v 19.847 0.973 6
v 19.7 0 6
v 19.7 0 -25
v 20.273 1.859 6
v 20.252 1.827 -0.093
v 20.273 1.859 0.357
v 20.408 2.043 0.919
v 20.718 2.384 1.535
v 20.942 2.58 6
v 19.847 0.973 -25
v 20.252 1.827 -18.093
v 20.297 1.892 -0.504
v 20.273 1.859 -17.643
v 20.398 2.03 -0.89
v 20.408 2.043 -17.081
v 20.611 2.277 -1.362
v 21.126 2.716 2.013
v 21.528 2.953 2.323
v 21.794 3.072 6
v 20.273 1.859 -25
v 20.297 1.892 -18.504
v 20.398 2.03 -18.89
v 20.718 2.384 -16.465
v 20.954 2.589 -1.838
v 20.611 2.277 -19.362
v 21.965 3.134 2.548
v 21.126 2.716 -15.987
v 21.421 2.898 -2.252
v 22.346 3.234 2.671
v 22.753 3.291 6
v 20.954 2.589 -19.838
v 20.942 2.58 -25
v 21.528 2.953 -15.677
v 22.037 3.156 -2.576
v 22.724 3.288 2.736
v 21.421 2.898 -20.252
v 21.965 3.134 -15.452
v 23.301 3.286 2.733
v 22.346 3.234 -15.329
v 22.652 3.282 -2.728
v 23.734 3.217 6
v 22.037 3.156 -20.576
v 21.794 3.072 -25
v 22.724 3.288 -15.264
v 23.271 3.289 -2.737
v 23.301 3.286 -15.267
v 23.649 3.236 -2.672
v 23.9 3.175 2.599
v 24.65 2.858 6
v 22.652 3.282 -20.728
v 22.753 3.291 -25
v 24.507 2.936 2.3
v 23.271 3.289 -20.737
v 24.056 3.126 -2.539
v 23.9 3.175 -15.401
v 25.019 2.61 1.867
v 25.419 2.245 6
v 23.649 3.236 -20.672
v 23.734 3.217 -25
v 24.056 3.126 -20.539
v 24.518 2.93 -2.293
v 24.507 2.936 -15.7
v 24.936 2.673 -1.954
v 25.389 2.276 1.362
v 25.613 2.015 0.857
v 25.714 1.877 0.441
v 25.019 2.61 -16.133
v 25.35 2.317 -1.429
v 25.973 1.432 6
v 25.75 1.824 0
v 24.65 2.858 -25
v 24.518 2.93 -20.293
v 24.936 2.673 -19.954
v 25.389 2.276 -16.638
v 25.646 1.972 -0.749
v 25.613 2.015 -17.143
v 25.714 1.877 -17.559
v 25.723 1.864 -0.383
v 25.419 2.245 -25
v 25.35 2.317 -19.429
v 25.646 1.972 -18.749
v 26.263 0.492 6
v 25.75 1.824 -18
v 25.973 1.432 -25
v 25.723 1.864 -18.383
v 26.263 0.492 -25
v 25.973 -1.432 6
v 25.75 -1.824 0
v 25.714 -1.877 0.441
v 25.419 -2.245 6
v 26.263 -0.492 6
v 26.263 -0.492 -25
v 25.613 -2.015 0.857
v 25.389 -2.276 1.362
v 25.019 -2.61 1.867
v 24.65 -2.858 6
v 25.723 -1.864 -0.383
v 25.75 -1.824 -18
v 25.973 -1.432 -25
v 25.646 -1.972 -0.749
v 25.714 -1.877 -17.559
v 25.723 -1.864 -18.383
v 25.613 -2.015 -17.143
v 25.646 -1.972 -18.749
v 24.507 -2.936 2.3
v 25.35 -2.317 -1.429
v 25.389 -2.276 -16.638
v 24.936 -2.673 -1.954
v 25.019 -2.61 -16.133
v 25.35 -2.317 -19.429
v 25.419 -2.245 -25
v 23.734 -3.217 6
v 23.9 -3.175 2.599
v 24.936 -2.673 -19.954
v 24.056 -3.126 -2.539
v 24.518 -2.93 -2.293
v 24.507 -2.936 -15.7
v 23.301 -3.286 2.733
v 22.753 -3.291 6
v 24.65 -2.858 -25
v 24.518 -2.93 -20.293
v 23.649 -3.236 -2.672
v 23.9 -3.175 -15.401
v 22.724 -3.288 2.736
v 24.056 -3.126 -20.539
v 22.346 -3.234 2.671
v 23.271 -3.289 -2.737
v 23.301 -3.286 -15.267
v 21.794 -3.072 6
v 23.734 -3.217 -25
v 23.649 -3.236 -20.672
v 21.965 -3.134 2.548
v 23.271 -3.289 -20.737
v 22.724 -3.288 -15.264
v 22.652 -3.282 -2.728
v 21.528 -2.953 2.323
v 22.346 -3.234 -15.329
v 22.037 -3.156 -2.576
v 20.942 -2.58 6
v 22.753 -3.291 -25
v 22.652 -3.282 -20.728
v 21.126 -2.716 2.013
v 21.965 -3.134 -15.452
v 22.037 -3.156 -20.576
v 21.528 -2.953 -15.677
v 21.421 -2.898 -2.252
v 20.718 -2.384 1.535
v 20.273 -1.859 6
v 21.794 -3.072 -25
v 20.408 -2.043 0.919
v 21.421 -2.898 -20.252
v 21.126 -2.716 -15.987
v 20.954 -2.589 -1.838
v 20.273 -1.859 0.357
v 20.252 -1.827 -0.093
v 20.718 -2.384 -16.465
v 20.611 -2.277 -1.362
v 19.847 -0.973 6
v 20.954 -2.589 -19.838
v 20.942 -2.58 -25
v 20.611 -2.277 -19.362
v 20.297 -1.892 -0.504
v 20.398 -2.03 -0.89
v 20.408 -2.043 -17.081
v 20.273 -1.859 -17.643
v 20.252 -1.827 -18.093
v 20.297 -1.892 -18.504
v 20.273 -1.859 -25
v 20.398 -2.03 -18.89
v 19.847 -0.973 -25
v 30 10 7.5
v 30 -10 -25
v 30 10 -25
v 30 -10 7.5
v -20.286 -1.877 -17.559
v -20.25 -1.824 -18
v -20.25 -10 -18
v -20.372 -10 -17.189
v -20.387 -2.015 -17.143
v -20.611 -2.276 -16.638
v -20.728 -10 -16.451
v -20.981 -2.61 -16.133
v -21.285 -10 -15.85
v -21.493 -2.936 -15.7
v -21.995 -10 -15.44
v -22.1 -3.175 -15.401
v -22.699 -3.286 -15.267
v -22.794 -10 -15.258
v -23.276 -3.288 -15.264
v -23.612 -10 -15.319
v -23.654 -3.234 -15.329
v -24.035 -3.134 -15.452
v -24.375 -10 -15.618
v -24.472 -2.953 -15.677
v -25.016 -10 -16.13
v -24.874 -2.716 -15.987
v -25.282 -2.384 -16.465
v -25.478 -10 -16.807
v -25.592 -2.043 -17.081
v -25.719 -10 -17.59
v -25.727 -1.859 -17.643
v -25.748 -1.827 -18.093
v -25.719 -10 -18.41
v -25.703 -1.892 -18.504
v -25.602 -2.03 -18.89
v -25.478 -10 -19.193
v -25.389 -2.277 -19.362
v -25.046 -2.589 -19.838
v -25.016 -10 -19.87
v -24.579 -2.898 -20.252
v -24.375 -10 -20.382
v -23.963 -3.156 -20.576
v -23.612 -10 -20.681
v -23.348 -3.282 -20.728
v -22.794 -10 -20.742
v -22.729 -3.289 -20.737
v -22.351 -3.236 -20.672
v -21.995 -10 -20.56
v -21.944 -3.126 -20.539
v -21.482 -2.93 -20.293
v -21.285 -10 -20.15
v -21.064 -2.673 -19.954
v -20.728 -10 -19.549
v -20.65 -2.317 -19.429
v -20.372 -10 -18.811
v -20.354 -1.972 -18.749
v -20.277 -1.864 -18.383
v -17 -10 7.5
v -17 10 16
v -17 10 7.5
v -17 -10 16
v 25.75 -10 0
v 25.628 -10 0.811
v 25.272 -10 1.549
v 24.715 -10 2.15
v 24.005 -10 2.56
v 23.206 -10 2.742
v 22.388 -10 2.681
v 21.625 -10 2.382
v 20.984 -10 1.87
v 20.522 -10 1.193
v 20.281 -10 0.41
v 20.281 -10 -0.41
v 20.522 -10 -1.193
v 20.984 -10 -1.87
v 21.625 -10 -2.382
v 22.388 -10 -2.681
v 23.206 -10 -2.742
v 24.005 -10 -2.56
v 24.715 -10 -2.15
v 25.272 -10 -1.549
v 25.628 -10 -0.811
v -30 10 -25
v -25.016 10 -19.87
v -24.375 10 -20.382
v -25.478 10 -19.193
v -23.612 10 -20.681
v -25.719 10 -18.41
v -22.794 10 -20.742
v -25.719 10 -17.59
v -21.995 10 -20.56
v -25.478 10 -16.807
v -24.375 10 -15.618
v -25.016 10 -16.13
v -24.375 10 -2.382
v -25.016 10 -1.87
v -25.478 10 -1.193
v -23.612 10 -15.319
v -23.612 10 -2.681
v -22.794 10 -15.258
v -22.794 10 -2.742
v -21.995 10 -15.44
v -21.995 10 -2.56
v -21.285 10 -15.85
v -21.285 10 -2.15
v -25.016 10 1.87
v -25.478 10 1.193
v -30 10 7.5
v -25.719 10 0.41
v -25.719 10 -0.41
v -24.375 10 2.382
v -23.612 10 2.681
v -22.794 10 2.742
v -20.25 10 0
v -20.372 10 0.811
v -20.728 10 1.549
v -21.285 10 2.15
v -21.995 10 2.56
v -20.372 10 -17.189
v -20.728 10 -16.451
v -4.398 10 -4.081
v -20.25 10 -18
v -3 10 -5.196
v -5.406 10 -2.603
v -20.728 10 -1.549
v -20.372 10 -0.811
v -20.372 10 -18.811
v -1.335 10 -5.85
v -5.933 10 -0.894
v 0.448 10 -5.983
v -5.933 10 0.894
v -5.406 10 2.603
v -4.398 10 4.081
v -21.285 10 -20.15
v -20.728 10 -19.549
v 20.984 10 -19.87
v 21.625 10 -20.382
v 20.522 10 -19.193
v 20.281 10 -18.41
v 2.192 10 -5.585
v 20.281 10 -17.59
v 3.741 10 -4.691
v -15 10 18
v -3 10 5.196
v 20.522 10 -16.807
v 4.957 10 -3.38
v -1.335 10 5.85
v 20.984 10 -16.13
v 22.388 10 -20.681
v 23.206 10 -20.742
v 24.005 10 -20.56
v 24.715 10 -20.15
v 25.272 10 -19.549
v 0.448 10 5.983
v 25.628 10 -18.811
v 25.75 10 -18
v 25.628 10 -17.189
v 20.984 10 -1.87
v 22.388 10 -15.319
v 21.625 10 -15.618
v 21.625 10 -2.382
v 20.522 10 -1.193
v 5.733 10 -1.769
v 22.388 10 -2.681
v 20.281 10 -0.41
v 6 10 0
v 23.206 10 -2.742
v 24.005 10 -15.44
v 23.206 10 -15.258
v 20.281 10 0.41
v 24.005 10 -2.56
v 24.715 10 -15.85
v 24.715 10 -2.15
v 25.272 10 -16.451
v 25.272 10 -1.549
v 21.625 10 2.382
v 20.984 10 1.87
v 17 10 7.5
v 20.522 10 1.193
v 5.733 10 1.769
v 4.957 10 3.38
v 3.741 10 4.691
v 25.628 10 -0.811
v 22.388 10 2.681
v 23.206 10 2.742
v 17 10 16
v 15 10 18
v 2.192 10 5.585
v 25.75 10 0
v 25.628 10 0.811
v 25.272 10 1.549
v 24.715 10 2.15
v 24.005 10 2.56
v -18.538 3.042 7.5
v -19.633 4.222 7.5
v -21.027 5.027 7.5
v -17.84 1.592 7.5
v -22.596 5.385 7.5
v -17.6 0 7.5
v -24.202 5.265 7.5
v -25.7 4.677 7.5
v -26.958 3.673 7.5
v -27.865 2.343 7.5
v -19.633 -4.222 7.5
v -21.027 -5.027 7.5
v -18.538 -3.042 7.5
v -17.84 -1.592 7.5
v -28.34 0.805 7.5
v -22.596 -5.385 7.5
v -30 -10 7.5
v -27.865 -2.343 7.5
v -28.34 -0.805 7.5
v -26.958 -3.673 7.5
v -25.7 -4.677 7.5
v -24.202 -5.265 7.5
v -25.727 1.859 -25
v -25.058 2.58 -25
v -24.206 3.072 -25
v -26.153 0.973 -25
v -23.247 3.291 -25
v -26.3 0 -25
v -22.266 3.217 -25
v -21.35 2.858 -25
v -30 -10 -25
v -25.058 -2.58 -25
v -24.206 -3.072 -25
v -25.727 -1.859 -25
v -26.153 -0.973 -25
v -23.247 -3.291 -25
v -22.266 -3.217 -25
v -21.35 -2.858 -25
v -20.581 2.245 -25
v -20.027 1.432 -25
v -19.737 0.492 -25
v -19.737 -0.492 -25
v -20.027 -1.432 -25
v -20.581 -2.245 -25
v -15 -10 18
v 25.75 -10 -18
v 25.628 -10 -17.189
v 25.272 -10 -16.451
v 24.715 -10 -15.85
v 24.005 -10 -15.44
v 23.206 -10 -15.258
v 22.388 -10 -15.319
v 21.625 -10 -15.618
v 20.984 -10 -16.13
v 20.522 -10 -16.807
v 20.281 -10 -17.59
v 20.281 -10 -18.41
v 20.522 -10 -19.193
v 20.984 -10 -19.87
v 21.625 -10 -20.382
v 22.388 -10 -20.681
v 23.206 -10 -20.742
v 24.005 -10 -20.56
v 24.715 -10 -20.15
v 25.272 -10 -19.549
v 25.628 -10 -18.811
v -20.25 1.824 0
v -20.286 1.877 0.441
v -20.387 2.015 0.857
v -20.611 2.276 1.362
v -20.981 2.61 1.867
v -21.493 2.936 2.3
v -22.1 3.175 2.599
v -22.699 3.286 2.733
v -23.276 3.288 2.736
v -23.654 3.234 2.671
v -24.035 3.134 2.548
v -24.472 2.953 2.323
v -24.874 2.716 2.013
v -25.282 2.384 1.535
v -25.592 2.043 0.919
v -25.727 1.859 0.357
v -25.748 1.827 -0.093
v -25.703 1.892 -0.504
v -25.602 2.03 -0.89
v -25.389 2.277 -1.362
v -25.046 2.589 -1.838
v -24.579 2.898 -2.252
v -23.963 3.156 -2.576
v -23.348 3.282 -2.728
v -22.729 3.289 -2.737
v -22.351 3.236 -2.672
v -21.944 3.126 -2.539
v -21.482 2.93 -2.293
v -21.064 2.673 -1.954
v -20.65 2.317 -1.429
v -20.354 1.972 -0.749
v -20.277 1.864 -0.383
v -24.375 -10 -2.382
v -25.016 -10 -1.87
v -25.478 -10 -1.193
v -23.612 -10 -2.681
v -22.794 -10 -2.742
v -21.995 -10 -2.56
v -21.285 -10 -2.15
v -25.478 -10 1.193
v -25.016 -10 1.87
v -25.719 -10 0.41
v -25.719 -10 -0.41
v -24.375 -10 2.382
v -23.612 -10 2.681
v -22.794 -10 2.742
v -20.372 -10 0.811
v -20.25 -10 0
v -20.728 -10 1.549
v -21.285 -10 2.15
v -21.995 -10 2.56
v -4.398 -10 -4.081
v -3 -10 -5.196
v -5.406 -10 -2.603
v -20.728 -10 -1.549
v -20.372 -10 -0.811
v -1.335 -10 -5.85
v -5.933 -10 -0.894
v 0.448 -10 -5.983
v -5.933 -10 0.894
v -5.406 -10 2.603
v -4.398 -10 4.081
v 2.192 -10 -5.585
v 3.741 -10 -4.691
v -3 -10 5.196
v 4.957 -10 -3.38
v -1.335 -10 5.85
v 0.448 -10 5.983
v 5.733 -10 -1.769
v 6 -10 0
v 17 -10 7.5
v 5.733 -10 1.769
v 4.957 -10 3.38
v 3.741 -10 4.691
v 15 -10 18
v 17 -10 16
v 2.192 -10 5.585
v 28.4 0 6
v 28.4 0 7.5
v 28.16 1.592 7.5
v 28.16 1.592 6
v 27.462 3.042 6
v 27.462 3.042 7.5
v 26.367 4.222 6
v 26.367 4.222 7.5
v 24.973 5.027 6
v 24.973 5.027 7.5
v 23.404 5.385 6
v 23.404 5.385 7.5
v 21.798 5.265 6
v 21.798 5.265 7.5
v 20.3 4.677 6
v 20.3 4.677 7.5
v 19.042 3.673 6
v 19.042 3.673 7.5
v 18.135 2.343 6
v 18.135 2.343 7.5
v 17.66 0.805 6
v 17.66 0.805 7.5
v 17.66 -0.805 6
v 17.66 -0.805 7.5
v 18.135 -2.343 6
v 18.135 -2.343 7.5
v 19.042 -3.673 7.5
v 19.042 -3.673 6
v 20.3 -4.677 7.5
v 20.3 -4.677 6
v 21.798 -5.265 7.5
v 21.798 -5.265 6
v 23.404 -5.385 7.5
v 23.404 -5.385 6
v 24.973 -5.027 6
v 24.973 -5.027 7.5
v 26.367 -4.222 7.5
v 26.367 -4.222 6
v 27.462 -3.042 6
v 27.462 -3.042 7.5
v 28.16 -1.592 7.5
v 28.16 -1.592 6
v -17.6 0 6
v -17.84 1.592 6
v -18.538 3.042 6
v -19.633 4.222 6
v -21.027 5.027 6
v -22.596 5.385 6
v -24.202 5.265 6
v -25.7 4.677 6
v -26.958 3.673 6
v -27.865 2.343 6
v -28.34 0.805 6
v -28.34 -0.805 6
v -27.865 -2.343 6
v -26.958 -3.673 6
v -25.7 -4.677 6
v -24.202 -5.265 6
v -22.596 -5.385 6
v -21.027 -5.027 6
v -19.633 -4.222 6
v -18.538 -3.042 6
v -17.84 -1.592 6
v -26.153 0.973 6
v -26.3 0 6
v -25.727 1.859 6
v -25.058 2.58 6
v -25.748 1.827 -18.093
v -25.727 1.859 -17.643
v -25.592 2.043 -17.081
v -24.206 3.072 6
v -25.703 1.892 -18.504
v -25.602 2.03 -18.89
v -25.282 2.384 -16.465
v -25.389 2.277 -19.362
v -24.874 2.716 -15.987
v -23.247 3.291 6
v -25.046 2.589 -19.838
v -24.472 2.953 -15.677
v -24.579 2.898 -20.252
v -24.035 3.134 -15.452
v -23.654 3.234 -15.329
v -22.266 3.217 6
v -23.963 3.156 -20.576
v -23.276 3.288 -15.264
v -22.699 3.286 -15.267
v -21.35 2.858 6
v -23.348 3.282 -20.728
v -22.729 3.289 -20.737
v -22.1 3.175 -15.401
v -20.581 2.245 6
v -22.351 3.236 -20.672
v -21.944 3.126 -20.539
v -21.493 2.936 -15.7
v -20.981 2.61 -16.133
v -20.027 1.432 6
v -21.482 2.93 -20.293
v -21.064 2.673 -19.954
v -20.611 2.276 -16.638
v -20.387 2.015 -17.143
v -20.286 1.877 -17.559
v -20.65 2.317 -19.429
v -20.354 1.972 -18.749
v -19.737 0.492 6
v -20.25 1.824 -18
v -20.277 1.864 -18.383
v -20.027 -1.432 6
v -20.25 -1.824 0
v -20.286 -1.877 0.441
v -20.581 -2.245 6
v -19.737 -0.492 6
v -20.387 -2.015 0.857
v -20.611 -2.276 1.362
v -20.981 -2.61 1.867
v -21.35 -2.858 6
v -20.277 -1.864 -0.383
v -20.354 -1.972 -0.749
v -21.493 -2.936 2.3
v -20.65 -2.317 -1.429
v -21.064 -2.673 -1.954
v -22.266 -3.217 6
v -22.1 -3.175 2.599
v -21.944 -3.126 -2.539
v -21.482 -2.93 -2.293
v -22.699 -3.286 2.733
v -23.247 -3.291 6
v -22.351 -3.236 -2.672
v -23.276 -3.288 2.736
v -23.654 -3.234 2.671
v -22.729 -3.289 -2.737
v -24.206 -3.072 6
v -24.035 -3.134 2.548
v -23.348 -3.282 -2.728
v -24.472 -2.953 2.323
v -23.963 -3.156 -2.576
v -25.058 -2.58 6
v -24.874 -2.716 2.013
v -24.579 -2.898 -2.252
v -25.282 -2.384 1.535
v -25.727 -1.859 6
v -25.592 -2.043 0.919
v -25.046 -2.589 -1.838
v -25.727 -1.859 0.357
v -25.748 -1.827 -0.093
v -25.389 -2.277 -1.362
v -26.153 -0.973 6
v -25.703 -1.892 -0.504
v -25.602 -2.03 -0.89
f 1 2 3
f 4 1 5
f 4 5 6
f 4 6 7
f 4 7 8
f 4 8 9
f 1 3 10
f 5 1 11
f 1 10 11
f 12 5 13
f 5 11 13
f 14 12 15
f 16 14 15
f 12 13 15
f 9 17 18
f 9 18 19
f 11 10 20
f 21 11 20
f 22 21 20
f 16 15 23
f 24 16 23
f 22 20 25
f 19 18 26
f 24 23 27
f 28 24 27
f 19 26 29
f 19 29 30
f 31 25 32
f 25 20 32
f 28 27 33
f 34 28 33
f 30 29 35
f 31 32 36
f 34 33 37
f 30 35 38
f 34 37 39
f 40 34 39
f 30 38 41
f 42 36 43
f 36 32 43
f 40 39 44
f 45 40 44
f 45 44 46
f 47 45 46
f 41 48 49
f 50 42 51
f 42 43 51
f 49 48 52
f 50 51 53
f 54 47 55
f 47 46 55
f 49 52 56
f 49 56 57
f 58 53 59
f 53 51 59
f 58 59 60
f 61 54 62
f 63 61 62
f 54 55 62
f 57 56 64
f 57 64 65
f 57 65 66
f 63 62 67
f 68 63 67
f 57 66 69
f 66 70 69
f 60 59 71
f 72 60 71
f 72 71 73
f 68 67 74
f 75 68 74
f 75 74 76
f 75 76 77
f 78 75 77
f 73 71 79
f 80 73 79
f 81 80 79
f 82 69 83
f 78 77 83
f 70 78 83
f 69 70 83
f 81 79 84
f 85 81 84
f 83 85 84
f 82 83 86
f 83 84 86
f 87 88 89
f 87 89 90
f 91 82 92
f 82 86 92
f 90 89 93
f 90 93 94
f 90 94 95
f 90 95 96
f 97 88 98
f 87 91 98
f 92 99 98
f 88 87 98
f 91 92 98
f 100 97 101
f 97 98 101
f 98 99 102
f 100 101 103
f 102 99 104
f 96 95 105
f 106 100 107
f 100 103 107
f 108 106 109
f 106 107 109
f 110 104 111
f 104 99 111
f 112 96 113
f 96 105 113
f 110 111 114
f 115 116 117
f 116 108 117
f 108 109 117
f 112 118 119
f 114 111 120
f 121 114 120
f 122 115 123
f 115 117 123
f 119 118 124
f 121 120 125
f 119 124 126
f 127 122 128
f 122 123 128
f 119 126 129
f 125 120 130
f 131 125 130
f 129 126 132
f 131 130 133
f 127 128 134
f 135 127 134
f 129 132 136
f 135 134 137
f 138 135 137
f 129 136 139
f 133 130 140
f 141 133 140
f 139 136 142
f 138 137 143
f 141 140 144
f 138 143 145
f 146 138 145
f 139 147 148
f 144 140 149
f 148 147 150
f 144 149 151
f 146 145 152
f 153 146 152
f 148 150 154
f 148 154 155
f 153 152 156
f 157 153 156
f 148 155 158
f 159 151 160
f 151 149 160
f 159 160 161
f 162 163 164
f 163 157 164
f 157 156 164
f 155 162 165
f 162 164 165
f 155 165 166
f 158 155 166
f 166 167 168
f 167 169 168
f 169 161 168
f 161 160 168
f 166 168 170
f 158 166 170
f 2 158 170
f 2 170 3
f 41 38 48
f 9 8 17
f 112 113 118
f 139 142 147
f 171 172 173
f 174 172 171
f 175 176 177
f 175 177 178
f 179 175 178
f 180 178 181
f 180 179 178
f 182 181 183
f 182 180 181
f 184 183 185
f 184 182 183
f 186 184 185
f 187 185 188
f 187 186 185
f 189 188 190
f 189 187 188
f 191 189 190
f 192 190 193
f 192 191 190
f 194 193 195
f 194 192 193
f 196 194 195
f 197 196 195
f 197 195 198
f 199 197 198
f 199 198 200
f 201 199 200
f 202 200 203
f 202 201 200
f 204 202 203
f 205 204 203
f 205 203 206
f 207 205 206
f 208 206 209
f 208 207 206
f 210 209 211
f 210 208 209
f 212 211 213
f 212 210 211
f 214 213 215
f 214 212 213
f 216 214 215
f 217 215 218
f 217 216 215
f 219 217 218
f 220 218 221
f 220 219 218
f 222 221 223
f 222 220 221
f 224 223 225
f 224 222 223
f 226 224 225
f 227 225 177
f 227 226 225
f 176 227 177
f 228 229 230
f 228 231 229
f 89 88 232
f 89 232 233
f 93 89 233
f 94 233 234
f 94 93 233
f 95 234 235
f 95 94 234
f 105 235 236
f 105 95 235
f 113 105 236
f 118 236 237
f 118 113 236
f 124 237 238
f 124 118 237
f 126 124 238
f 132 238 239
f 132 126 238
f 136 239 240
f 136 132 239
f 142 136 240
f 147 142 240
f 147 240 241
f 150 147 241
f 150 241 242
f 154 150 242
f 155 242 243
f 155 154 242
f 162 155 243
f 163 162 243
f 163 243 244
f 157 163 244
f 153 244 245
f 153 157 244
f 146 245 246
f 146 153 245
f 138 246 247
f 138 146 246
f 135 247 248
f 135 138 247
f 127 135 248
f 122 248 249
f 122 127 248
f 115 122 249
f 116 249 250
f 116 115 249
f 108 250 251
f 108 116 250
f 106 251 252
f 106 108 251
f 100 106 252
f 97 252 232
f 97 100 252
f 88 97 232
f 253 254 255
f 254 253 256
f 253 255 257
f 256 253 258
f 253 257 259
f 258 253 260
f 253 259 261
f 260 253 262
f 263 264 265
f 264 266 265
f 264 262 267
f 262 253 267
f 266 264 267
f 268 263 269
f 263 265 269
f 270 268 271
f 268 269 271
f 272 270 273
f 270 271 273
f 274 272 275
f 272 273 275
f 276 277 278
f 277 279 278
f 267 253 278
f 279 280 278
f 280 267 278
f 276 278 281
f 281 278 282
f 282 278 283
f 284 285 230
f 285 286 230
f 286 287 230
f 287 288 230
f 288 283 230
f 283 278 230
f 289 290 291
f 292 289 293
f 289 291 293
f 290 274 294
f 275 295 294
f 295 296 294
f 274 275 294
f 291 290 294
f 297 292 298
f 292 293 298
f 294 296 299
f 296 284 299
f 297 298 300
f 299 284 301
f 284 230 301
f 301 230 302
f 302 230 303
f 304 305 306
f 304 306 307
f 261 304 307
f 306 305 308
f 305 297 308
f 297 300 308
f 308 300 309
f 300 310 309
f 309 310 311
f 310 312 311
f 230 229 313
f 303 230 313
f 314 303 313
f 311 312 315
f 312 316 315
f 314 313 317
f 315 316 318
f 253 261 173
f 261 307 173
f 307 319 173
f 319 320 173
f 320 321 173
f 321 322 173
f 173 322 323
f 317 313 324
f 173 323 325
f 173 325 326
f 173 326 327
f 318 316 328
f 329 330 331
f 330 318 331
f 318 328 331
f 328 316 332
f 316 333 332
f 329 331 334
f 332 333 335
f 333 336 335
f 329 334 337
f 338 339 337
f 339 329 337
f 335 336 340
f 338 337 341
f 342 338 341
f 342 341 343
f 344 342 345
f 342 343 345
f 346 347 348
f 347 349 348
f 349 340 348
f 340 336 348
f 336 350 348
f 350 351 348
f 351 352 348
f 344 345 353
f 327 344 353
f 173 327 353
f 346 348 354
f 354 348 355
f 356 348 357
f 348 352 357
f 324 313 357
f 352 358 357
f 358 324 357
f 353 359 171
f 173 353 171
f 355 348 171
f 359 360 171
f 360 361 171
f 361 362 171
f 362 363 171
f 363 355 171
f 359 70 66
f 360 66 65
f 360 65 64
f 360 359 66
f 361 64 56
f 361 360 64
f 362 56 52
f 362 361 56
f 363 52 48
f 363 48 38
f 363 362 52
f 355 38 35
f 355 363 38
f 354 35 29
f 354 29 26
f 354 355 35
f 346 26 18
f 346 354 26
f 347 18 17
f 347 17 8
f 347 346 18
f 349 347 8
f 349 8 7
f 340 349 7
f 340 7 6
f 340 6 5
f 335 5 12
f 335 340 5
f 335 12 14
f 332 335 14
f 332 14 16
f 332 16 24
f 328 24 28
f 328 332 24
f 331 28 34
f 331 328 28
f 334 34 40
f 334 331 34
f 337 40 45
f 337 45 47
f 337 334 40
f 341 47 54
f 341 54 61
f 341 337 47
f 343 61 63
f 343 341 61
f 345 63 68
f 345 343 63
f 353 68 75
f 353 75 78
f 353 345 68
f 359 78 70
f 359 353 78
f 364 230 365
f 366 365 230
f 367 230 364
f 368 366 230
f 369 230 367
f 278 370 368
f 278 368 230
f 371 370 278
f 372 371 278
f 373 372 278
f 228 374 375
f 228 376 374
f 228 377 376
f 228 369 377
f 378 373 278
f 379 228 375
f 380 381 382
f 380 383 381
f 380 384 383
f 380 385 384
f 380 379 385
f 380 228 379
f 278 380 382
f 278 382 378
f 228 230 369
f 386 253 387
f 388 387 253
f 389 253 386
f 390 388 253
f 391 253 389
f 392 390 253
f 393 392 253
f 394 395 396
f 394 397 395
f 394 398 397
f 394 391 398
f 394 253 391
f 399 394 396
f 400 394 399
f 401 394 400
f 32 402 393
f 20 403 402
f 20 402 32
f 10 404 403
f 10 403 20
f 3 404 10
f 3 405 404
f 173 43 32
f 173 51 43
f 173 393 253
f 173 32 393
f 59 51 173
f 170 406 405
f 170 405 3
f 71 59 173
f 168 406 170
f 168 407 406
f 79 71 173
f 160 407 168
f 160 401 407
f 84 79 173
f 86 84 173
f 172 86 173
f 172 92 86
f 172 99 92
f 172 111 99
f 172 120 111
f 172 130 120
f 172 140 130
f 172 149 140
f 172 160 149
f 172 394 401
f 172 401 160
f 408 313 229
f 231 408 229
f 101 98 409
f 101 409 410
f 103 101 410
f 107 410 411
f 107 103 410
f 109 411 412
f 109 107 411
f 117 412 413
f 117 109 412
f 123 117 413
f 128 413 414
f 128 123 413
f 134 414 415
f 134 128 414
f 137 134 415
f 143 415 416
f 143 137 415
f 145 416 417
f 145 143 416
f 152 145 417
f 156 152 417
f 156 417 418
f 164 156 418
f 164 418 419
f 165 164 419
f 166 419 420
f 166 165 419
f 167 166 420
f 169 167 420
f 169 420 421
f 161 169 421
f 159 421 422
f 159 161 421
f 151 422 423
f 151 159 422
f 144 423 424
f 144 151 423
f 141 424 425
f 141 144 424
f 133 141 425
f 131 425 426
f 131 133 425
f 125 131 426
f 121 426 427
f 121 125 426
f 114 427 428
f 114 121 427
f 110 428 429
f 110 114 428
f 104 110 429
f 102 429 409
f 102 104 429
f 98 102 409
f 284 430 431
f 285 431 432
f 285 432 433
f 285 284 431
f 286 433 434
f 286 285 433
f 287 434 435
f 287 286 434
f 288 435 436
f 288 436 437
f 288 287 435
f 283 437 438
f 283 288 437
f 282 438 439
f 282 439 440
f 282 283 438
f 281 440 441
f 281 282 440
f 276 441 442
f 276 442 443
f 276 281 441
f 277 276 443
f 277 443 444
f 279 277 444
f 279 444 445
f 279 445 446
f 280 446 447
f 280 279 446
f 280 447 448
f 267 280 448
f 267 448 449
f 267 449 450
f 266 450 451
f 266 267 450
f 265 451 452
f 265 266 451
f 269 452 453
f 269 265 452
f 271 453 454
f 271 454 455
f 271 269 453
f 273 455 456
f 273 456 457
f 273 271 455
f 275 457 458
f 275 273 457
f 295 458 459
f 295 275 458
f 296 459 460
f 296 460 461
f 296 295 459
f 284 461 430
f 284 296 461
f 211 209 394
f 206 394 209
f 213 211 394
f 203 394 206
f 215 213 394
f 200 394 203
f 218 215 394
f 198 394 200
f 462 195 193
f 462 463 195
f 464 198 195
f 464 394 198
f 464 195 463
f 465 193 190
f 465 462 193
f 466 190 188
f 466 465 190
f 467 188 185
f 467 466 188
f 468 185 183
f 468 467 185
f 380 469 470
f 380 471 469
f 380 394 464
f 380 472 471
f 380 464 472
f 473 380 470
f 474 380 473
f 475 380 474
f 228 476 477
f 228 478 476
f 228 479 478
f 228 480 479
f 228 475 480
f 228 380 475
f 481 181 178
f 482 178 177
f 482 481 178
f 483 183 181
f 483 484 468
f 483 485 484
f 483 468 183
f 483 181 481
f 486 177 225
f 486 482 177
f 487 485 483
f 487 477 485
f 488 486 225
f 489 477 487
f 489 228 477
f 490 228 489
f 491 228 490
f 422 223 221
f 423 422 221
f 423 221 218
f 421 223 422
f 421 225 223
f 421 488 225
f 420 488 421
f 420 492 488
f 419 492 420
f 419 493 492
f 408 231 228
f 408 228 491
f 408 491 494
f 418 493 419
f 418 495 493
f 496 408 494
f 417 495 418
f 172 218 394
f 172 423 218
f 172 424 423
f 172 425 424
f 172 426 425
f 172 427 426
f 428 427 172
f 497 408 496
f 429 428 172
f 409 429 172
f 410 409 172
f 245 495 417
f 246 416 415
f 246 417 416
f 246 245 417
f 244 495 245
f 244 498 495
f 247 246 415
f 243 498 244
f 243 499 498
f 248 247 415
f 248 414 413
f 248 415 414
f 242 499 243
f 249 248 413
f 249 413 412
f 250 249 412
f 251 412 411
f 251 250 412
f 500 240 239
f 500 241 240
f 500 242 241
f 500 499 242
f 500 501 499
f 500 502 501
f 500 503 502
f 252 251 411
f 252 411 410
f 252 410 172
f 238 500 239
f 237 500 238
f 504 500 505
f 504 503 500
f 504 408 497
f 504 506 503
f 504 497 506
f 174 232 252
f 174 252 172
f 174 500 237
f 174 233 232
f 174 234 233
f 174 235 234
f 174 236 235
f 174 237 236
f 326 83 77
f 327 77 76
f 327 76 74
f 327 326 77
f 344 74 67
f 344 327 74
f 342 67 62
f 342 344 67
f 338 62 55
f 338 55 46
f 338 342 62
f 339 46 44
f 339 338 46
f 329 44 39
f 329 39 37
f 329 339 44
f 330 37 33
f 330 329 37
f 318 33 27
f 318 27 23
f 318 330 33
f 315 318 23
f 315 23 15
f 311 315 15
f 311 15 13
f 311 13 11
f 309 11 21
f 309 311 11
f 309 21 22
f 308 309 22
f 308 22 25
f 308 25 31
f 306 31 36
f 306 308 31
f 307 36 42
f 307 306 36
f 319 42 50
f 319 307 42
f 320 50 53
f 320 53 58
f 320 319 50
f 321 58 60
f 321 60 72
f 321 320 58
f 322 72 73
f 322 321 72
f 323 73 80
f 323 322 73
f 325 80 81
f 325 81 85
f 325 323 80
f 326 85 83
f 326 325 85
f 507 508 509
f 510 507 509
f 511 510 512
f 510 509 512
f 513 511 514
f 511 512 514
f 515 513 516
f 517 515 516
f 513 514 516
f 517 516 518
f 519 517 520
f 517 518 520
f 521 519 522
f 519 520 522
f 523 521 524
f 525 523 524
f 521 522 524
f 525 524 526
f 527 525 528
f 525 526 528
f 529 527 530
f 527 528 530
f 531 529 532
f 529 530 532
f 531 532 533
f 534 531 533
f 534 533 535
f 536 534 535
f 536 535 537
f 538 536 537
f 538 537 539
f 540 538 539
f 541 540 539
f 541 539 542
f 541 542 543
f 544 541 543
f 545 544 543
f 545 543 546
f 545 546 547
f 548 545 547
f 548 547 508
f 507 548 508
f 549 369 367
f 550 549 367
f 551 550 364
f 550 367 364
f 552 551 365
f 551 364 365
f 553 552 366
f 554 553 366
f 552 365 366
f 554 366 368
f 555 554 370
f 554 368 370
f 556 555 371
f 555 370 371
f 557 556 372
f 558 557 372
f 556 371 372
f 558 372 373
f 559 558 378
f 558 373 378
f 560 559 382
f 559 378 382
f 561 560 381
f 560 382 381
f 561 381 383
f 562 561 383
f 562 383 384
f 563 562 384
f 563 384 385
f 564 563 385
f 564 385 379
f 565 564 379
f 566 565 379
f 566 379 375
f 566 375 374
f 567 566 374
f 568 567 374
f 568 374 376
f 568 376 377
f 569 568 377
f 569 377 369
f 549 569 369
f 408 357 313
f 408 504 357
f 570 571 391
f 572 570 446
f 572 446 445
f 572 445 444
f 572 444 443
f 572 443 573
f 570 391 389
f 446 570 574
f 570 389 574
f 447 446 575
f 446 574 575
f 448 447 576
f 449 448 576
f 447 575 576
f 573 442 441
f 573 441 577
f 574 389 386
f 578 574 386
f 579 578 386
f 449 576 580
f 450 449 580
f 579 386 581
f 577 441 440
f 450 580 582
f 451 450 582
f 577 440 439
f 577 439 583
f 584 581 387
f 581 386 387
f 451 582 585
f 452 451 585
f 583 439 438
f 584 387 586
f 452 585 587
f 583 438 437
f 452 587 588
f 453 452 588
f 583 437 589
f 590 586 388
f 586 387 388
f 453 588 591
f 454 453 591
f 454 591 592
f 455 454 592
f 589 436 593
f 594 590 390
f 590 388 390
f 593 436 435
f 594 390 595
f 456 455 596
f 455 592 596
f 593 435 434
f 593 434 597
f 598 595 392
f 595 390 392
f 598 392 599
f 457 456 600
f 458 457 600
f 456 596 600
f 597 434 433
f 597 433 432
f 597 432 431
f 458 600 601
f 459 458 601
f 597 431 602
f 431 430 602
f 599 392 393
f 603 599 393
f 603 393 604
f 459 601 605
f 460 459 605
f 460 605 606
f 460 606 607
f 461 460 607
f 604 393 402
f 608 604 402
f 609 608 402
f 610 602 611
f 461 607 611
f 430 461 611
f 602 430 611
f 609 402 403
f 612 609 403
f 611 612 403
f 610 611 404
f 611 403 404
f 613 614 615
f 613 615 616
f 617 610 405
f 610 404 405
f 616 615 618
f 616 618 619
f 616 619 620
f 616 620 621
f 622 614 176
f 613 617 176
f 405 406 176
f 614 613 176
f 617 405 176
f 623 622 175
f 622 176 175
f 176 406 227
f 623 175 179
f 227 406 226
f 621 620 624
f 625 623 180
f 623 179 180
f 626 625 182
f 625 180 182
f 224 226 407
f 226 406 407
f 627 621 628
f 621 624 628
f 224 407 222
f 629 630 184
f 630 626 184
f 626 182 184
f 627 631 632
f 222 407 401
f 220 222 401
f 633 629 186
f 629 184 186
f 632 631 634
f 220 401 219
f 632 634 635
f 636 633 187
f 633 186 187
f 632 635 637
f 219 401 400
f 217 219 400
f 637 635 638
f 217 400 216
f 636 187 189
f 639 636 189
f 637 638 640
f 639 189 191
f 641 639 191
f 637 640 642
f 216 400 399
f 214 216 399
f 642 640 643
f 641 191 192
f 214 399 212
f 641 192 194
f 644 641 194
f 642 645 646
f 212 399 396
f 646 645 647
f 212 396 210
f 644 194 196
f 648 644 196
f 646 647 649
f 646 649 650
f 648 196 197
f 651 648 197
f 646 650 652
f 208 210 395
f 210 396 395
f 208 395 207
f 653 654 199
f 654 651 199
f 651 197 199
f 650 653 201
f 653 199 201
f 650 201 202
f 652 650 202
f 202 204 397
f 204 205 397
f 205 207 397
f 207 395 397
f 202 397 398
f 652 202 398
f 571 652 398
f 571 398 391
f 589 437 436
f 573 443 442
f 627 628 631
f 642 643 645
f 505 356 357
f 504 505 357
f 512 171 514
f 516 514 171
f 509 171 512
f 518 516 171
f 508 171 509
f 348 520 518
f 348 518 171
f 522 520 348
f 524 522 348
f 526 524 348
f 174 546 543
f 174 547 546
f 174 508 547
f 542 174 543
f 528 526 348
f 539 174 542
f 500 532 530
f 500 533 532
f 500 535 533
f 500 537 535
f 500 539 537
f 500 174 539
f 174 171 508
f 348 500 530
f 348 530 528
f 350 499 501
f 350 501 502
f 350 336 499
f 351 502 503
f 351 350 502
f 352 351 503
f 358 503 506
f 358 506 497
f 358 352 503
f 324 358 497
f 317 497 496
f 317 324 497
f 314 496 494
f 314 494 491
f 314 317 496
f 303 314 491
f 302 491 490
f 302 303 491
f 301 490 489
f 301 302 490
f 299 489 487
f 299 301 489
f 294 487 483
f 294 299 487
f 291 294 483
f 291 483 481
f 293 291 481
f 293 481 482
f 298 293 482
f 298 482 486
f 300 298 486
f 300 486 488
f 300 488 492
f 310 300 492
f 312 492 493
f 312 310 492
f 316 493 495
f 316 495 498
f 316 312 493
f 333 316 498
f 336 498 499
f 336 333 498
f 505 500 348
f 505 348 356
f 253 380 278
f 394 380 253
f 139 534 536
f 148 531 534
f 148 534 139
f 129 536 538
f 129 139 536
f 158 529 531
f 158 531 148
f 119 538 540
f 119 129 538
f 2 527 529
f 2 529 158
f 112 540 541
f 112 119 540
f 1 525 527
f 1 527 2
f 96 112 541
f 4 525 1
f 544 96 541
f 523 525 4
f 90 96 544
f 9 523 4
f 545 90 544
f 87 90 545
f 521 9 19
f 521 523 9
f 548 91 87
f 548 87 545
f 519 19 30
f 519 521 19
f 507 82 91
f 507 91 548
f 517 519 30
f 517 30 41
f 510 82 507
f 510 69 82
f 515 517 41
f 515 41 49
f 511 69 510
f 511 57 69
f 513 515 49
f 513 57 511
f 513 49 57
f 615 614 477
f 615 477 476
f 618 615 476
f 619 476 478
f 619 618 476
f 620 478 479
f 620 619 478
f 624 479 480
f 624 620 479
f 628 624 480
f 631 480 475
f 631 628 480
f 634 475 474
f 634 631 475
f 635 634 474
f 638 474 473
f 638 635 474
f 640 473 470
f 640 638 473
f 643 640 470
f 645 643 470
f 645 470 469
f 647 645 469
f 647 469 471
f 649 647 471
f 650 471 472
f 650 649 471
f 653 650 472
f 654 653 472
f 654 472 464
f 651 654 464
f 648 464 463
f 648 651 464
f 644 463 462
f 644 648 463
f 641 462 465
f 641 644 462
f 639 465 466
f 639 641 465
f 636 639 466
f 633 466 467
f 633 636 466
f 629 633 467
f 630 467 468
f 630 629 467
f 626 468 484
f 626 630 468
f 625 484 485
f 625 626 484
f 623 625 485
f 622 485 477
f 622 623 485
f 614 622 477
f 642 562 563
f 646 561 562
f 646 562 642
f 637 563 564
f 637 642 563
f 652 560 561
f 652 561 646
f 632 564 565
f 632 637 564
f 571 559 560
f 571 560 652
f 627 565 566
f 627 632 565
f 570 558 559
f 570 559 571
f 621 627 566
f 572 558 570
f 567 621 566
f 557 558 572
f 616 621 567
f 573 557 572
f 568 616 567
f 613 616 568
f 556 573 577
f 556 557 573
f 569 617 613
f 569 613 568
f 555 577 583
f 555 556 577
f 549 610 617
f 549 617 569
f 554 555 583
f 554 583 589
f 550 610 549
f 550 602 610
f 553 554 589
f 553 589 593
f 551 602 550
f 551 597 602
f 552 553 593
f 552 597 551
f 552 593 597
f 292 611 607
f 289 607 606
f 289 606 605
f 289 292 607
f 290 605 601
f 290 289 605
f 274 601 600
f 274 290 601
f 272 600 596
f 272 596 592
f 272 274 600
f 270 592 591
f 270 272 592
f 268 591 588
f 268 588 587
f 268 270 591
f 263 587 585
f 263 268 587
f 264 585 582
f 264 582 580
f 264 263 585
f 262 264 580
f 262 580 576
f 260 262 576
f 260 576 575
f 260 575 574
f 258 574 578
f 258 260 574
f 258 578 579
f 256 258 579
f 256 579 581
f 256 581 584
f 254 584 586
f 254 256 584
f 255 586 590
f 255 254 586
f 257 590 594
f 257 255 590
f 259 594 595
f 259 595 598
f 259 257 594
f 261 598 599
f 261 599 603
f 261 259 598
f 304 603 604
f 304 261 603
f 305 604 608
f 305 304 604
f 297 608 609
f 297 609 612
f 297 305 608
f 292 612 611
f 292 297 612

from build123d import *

# Parameters (mm, degrees)
F0_R           = 2.75
F0_R_2         = 6
F1_DEPTH       = 10
F3_D           = 6.6
F3_CBORE_D     = 10.8
F3_CBORE_DEPTH = 1.5


with BuildPart() as f1:
    # F0 (on Front) → F1 (new body, symmetric)
    with BuildSketch(Plane.XZ):
        Polygon((-30, 7.5), (-30, -25), (30, -25), (30, 7.5), (17, 7.5), (17, 16), (15, 18), (-15, 18), (-17, 16), (-17, 7.5), align=None)
        with Locations((-23, -18)):
            Circle(F0_R, mode=Mode.SUBTRACT)
        with Locations((23, -18)):
            Circle(F0_R, mode=Mode.SUBTRACT)
        with Locations((-23, 0)):
            Circle(F0_R, mode=Mode.SUBTRACT)
        Circle(F0_R_2, mode=Mode.SUBTRACT)
        with Locations((23, 0)):
            Circle(F0_R, mode=Mode.SUBTRACT)
    extrude(amount=F1_DEPTH, both=True)

    # F3 (through all)
    with Locations(Plane.XY.offset(7.5)):
        with Locations((-23, 0), (23, 0)):
            CounterBoreHole(F3_D / 2, F3_CBORE_D / 2, F3_CBORE_DEPTH)


solid = f1.part
